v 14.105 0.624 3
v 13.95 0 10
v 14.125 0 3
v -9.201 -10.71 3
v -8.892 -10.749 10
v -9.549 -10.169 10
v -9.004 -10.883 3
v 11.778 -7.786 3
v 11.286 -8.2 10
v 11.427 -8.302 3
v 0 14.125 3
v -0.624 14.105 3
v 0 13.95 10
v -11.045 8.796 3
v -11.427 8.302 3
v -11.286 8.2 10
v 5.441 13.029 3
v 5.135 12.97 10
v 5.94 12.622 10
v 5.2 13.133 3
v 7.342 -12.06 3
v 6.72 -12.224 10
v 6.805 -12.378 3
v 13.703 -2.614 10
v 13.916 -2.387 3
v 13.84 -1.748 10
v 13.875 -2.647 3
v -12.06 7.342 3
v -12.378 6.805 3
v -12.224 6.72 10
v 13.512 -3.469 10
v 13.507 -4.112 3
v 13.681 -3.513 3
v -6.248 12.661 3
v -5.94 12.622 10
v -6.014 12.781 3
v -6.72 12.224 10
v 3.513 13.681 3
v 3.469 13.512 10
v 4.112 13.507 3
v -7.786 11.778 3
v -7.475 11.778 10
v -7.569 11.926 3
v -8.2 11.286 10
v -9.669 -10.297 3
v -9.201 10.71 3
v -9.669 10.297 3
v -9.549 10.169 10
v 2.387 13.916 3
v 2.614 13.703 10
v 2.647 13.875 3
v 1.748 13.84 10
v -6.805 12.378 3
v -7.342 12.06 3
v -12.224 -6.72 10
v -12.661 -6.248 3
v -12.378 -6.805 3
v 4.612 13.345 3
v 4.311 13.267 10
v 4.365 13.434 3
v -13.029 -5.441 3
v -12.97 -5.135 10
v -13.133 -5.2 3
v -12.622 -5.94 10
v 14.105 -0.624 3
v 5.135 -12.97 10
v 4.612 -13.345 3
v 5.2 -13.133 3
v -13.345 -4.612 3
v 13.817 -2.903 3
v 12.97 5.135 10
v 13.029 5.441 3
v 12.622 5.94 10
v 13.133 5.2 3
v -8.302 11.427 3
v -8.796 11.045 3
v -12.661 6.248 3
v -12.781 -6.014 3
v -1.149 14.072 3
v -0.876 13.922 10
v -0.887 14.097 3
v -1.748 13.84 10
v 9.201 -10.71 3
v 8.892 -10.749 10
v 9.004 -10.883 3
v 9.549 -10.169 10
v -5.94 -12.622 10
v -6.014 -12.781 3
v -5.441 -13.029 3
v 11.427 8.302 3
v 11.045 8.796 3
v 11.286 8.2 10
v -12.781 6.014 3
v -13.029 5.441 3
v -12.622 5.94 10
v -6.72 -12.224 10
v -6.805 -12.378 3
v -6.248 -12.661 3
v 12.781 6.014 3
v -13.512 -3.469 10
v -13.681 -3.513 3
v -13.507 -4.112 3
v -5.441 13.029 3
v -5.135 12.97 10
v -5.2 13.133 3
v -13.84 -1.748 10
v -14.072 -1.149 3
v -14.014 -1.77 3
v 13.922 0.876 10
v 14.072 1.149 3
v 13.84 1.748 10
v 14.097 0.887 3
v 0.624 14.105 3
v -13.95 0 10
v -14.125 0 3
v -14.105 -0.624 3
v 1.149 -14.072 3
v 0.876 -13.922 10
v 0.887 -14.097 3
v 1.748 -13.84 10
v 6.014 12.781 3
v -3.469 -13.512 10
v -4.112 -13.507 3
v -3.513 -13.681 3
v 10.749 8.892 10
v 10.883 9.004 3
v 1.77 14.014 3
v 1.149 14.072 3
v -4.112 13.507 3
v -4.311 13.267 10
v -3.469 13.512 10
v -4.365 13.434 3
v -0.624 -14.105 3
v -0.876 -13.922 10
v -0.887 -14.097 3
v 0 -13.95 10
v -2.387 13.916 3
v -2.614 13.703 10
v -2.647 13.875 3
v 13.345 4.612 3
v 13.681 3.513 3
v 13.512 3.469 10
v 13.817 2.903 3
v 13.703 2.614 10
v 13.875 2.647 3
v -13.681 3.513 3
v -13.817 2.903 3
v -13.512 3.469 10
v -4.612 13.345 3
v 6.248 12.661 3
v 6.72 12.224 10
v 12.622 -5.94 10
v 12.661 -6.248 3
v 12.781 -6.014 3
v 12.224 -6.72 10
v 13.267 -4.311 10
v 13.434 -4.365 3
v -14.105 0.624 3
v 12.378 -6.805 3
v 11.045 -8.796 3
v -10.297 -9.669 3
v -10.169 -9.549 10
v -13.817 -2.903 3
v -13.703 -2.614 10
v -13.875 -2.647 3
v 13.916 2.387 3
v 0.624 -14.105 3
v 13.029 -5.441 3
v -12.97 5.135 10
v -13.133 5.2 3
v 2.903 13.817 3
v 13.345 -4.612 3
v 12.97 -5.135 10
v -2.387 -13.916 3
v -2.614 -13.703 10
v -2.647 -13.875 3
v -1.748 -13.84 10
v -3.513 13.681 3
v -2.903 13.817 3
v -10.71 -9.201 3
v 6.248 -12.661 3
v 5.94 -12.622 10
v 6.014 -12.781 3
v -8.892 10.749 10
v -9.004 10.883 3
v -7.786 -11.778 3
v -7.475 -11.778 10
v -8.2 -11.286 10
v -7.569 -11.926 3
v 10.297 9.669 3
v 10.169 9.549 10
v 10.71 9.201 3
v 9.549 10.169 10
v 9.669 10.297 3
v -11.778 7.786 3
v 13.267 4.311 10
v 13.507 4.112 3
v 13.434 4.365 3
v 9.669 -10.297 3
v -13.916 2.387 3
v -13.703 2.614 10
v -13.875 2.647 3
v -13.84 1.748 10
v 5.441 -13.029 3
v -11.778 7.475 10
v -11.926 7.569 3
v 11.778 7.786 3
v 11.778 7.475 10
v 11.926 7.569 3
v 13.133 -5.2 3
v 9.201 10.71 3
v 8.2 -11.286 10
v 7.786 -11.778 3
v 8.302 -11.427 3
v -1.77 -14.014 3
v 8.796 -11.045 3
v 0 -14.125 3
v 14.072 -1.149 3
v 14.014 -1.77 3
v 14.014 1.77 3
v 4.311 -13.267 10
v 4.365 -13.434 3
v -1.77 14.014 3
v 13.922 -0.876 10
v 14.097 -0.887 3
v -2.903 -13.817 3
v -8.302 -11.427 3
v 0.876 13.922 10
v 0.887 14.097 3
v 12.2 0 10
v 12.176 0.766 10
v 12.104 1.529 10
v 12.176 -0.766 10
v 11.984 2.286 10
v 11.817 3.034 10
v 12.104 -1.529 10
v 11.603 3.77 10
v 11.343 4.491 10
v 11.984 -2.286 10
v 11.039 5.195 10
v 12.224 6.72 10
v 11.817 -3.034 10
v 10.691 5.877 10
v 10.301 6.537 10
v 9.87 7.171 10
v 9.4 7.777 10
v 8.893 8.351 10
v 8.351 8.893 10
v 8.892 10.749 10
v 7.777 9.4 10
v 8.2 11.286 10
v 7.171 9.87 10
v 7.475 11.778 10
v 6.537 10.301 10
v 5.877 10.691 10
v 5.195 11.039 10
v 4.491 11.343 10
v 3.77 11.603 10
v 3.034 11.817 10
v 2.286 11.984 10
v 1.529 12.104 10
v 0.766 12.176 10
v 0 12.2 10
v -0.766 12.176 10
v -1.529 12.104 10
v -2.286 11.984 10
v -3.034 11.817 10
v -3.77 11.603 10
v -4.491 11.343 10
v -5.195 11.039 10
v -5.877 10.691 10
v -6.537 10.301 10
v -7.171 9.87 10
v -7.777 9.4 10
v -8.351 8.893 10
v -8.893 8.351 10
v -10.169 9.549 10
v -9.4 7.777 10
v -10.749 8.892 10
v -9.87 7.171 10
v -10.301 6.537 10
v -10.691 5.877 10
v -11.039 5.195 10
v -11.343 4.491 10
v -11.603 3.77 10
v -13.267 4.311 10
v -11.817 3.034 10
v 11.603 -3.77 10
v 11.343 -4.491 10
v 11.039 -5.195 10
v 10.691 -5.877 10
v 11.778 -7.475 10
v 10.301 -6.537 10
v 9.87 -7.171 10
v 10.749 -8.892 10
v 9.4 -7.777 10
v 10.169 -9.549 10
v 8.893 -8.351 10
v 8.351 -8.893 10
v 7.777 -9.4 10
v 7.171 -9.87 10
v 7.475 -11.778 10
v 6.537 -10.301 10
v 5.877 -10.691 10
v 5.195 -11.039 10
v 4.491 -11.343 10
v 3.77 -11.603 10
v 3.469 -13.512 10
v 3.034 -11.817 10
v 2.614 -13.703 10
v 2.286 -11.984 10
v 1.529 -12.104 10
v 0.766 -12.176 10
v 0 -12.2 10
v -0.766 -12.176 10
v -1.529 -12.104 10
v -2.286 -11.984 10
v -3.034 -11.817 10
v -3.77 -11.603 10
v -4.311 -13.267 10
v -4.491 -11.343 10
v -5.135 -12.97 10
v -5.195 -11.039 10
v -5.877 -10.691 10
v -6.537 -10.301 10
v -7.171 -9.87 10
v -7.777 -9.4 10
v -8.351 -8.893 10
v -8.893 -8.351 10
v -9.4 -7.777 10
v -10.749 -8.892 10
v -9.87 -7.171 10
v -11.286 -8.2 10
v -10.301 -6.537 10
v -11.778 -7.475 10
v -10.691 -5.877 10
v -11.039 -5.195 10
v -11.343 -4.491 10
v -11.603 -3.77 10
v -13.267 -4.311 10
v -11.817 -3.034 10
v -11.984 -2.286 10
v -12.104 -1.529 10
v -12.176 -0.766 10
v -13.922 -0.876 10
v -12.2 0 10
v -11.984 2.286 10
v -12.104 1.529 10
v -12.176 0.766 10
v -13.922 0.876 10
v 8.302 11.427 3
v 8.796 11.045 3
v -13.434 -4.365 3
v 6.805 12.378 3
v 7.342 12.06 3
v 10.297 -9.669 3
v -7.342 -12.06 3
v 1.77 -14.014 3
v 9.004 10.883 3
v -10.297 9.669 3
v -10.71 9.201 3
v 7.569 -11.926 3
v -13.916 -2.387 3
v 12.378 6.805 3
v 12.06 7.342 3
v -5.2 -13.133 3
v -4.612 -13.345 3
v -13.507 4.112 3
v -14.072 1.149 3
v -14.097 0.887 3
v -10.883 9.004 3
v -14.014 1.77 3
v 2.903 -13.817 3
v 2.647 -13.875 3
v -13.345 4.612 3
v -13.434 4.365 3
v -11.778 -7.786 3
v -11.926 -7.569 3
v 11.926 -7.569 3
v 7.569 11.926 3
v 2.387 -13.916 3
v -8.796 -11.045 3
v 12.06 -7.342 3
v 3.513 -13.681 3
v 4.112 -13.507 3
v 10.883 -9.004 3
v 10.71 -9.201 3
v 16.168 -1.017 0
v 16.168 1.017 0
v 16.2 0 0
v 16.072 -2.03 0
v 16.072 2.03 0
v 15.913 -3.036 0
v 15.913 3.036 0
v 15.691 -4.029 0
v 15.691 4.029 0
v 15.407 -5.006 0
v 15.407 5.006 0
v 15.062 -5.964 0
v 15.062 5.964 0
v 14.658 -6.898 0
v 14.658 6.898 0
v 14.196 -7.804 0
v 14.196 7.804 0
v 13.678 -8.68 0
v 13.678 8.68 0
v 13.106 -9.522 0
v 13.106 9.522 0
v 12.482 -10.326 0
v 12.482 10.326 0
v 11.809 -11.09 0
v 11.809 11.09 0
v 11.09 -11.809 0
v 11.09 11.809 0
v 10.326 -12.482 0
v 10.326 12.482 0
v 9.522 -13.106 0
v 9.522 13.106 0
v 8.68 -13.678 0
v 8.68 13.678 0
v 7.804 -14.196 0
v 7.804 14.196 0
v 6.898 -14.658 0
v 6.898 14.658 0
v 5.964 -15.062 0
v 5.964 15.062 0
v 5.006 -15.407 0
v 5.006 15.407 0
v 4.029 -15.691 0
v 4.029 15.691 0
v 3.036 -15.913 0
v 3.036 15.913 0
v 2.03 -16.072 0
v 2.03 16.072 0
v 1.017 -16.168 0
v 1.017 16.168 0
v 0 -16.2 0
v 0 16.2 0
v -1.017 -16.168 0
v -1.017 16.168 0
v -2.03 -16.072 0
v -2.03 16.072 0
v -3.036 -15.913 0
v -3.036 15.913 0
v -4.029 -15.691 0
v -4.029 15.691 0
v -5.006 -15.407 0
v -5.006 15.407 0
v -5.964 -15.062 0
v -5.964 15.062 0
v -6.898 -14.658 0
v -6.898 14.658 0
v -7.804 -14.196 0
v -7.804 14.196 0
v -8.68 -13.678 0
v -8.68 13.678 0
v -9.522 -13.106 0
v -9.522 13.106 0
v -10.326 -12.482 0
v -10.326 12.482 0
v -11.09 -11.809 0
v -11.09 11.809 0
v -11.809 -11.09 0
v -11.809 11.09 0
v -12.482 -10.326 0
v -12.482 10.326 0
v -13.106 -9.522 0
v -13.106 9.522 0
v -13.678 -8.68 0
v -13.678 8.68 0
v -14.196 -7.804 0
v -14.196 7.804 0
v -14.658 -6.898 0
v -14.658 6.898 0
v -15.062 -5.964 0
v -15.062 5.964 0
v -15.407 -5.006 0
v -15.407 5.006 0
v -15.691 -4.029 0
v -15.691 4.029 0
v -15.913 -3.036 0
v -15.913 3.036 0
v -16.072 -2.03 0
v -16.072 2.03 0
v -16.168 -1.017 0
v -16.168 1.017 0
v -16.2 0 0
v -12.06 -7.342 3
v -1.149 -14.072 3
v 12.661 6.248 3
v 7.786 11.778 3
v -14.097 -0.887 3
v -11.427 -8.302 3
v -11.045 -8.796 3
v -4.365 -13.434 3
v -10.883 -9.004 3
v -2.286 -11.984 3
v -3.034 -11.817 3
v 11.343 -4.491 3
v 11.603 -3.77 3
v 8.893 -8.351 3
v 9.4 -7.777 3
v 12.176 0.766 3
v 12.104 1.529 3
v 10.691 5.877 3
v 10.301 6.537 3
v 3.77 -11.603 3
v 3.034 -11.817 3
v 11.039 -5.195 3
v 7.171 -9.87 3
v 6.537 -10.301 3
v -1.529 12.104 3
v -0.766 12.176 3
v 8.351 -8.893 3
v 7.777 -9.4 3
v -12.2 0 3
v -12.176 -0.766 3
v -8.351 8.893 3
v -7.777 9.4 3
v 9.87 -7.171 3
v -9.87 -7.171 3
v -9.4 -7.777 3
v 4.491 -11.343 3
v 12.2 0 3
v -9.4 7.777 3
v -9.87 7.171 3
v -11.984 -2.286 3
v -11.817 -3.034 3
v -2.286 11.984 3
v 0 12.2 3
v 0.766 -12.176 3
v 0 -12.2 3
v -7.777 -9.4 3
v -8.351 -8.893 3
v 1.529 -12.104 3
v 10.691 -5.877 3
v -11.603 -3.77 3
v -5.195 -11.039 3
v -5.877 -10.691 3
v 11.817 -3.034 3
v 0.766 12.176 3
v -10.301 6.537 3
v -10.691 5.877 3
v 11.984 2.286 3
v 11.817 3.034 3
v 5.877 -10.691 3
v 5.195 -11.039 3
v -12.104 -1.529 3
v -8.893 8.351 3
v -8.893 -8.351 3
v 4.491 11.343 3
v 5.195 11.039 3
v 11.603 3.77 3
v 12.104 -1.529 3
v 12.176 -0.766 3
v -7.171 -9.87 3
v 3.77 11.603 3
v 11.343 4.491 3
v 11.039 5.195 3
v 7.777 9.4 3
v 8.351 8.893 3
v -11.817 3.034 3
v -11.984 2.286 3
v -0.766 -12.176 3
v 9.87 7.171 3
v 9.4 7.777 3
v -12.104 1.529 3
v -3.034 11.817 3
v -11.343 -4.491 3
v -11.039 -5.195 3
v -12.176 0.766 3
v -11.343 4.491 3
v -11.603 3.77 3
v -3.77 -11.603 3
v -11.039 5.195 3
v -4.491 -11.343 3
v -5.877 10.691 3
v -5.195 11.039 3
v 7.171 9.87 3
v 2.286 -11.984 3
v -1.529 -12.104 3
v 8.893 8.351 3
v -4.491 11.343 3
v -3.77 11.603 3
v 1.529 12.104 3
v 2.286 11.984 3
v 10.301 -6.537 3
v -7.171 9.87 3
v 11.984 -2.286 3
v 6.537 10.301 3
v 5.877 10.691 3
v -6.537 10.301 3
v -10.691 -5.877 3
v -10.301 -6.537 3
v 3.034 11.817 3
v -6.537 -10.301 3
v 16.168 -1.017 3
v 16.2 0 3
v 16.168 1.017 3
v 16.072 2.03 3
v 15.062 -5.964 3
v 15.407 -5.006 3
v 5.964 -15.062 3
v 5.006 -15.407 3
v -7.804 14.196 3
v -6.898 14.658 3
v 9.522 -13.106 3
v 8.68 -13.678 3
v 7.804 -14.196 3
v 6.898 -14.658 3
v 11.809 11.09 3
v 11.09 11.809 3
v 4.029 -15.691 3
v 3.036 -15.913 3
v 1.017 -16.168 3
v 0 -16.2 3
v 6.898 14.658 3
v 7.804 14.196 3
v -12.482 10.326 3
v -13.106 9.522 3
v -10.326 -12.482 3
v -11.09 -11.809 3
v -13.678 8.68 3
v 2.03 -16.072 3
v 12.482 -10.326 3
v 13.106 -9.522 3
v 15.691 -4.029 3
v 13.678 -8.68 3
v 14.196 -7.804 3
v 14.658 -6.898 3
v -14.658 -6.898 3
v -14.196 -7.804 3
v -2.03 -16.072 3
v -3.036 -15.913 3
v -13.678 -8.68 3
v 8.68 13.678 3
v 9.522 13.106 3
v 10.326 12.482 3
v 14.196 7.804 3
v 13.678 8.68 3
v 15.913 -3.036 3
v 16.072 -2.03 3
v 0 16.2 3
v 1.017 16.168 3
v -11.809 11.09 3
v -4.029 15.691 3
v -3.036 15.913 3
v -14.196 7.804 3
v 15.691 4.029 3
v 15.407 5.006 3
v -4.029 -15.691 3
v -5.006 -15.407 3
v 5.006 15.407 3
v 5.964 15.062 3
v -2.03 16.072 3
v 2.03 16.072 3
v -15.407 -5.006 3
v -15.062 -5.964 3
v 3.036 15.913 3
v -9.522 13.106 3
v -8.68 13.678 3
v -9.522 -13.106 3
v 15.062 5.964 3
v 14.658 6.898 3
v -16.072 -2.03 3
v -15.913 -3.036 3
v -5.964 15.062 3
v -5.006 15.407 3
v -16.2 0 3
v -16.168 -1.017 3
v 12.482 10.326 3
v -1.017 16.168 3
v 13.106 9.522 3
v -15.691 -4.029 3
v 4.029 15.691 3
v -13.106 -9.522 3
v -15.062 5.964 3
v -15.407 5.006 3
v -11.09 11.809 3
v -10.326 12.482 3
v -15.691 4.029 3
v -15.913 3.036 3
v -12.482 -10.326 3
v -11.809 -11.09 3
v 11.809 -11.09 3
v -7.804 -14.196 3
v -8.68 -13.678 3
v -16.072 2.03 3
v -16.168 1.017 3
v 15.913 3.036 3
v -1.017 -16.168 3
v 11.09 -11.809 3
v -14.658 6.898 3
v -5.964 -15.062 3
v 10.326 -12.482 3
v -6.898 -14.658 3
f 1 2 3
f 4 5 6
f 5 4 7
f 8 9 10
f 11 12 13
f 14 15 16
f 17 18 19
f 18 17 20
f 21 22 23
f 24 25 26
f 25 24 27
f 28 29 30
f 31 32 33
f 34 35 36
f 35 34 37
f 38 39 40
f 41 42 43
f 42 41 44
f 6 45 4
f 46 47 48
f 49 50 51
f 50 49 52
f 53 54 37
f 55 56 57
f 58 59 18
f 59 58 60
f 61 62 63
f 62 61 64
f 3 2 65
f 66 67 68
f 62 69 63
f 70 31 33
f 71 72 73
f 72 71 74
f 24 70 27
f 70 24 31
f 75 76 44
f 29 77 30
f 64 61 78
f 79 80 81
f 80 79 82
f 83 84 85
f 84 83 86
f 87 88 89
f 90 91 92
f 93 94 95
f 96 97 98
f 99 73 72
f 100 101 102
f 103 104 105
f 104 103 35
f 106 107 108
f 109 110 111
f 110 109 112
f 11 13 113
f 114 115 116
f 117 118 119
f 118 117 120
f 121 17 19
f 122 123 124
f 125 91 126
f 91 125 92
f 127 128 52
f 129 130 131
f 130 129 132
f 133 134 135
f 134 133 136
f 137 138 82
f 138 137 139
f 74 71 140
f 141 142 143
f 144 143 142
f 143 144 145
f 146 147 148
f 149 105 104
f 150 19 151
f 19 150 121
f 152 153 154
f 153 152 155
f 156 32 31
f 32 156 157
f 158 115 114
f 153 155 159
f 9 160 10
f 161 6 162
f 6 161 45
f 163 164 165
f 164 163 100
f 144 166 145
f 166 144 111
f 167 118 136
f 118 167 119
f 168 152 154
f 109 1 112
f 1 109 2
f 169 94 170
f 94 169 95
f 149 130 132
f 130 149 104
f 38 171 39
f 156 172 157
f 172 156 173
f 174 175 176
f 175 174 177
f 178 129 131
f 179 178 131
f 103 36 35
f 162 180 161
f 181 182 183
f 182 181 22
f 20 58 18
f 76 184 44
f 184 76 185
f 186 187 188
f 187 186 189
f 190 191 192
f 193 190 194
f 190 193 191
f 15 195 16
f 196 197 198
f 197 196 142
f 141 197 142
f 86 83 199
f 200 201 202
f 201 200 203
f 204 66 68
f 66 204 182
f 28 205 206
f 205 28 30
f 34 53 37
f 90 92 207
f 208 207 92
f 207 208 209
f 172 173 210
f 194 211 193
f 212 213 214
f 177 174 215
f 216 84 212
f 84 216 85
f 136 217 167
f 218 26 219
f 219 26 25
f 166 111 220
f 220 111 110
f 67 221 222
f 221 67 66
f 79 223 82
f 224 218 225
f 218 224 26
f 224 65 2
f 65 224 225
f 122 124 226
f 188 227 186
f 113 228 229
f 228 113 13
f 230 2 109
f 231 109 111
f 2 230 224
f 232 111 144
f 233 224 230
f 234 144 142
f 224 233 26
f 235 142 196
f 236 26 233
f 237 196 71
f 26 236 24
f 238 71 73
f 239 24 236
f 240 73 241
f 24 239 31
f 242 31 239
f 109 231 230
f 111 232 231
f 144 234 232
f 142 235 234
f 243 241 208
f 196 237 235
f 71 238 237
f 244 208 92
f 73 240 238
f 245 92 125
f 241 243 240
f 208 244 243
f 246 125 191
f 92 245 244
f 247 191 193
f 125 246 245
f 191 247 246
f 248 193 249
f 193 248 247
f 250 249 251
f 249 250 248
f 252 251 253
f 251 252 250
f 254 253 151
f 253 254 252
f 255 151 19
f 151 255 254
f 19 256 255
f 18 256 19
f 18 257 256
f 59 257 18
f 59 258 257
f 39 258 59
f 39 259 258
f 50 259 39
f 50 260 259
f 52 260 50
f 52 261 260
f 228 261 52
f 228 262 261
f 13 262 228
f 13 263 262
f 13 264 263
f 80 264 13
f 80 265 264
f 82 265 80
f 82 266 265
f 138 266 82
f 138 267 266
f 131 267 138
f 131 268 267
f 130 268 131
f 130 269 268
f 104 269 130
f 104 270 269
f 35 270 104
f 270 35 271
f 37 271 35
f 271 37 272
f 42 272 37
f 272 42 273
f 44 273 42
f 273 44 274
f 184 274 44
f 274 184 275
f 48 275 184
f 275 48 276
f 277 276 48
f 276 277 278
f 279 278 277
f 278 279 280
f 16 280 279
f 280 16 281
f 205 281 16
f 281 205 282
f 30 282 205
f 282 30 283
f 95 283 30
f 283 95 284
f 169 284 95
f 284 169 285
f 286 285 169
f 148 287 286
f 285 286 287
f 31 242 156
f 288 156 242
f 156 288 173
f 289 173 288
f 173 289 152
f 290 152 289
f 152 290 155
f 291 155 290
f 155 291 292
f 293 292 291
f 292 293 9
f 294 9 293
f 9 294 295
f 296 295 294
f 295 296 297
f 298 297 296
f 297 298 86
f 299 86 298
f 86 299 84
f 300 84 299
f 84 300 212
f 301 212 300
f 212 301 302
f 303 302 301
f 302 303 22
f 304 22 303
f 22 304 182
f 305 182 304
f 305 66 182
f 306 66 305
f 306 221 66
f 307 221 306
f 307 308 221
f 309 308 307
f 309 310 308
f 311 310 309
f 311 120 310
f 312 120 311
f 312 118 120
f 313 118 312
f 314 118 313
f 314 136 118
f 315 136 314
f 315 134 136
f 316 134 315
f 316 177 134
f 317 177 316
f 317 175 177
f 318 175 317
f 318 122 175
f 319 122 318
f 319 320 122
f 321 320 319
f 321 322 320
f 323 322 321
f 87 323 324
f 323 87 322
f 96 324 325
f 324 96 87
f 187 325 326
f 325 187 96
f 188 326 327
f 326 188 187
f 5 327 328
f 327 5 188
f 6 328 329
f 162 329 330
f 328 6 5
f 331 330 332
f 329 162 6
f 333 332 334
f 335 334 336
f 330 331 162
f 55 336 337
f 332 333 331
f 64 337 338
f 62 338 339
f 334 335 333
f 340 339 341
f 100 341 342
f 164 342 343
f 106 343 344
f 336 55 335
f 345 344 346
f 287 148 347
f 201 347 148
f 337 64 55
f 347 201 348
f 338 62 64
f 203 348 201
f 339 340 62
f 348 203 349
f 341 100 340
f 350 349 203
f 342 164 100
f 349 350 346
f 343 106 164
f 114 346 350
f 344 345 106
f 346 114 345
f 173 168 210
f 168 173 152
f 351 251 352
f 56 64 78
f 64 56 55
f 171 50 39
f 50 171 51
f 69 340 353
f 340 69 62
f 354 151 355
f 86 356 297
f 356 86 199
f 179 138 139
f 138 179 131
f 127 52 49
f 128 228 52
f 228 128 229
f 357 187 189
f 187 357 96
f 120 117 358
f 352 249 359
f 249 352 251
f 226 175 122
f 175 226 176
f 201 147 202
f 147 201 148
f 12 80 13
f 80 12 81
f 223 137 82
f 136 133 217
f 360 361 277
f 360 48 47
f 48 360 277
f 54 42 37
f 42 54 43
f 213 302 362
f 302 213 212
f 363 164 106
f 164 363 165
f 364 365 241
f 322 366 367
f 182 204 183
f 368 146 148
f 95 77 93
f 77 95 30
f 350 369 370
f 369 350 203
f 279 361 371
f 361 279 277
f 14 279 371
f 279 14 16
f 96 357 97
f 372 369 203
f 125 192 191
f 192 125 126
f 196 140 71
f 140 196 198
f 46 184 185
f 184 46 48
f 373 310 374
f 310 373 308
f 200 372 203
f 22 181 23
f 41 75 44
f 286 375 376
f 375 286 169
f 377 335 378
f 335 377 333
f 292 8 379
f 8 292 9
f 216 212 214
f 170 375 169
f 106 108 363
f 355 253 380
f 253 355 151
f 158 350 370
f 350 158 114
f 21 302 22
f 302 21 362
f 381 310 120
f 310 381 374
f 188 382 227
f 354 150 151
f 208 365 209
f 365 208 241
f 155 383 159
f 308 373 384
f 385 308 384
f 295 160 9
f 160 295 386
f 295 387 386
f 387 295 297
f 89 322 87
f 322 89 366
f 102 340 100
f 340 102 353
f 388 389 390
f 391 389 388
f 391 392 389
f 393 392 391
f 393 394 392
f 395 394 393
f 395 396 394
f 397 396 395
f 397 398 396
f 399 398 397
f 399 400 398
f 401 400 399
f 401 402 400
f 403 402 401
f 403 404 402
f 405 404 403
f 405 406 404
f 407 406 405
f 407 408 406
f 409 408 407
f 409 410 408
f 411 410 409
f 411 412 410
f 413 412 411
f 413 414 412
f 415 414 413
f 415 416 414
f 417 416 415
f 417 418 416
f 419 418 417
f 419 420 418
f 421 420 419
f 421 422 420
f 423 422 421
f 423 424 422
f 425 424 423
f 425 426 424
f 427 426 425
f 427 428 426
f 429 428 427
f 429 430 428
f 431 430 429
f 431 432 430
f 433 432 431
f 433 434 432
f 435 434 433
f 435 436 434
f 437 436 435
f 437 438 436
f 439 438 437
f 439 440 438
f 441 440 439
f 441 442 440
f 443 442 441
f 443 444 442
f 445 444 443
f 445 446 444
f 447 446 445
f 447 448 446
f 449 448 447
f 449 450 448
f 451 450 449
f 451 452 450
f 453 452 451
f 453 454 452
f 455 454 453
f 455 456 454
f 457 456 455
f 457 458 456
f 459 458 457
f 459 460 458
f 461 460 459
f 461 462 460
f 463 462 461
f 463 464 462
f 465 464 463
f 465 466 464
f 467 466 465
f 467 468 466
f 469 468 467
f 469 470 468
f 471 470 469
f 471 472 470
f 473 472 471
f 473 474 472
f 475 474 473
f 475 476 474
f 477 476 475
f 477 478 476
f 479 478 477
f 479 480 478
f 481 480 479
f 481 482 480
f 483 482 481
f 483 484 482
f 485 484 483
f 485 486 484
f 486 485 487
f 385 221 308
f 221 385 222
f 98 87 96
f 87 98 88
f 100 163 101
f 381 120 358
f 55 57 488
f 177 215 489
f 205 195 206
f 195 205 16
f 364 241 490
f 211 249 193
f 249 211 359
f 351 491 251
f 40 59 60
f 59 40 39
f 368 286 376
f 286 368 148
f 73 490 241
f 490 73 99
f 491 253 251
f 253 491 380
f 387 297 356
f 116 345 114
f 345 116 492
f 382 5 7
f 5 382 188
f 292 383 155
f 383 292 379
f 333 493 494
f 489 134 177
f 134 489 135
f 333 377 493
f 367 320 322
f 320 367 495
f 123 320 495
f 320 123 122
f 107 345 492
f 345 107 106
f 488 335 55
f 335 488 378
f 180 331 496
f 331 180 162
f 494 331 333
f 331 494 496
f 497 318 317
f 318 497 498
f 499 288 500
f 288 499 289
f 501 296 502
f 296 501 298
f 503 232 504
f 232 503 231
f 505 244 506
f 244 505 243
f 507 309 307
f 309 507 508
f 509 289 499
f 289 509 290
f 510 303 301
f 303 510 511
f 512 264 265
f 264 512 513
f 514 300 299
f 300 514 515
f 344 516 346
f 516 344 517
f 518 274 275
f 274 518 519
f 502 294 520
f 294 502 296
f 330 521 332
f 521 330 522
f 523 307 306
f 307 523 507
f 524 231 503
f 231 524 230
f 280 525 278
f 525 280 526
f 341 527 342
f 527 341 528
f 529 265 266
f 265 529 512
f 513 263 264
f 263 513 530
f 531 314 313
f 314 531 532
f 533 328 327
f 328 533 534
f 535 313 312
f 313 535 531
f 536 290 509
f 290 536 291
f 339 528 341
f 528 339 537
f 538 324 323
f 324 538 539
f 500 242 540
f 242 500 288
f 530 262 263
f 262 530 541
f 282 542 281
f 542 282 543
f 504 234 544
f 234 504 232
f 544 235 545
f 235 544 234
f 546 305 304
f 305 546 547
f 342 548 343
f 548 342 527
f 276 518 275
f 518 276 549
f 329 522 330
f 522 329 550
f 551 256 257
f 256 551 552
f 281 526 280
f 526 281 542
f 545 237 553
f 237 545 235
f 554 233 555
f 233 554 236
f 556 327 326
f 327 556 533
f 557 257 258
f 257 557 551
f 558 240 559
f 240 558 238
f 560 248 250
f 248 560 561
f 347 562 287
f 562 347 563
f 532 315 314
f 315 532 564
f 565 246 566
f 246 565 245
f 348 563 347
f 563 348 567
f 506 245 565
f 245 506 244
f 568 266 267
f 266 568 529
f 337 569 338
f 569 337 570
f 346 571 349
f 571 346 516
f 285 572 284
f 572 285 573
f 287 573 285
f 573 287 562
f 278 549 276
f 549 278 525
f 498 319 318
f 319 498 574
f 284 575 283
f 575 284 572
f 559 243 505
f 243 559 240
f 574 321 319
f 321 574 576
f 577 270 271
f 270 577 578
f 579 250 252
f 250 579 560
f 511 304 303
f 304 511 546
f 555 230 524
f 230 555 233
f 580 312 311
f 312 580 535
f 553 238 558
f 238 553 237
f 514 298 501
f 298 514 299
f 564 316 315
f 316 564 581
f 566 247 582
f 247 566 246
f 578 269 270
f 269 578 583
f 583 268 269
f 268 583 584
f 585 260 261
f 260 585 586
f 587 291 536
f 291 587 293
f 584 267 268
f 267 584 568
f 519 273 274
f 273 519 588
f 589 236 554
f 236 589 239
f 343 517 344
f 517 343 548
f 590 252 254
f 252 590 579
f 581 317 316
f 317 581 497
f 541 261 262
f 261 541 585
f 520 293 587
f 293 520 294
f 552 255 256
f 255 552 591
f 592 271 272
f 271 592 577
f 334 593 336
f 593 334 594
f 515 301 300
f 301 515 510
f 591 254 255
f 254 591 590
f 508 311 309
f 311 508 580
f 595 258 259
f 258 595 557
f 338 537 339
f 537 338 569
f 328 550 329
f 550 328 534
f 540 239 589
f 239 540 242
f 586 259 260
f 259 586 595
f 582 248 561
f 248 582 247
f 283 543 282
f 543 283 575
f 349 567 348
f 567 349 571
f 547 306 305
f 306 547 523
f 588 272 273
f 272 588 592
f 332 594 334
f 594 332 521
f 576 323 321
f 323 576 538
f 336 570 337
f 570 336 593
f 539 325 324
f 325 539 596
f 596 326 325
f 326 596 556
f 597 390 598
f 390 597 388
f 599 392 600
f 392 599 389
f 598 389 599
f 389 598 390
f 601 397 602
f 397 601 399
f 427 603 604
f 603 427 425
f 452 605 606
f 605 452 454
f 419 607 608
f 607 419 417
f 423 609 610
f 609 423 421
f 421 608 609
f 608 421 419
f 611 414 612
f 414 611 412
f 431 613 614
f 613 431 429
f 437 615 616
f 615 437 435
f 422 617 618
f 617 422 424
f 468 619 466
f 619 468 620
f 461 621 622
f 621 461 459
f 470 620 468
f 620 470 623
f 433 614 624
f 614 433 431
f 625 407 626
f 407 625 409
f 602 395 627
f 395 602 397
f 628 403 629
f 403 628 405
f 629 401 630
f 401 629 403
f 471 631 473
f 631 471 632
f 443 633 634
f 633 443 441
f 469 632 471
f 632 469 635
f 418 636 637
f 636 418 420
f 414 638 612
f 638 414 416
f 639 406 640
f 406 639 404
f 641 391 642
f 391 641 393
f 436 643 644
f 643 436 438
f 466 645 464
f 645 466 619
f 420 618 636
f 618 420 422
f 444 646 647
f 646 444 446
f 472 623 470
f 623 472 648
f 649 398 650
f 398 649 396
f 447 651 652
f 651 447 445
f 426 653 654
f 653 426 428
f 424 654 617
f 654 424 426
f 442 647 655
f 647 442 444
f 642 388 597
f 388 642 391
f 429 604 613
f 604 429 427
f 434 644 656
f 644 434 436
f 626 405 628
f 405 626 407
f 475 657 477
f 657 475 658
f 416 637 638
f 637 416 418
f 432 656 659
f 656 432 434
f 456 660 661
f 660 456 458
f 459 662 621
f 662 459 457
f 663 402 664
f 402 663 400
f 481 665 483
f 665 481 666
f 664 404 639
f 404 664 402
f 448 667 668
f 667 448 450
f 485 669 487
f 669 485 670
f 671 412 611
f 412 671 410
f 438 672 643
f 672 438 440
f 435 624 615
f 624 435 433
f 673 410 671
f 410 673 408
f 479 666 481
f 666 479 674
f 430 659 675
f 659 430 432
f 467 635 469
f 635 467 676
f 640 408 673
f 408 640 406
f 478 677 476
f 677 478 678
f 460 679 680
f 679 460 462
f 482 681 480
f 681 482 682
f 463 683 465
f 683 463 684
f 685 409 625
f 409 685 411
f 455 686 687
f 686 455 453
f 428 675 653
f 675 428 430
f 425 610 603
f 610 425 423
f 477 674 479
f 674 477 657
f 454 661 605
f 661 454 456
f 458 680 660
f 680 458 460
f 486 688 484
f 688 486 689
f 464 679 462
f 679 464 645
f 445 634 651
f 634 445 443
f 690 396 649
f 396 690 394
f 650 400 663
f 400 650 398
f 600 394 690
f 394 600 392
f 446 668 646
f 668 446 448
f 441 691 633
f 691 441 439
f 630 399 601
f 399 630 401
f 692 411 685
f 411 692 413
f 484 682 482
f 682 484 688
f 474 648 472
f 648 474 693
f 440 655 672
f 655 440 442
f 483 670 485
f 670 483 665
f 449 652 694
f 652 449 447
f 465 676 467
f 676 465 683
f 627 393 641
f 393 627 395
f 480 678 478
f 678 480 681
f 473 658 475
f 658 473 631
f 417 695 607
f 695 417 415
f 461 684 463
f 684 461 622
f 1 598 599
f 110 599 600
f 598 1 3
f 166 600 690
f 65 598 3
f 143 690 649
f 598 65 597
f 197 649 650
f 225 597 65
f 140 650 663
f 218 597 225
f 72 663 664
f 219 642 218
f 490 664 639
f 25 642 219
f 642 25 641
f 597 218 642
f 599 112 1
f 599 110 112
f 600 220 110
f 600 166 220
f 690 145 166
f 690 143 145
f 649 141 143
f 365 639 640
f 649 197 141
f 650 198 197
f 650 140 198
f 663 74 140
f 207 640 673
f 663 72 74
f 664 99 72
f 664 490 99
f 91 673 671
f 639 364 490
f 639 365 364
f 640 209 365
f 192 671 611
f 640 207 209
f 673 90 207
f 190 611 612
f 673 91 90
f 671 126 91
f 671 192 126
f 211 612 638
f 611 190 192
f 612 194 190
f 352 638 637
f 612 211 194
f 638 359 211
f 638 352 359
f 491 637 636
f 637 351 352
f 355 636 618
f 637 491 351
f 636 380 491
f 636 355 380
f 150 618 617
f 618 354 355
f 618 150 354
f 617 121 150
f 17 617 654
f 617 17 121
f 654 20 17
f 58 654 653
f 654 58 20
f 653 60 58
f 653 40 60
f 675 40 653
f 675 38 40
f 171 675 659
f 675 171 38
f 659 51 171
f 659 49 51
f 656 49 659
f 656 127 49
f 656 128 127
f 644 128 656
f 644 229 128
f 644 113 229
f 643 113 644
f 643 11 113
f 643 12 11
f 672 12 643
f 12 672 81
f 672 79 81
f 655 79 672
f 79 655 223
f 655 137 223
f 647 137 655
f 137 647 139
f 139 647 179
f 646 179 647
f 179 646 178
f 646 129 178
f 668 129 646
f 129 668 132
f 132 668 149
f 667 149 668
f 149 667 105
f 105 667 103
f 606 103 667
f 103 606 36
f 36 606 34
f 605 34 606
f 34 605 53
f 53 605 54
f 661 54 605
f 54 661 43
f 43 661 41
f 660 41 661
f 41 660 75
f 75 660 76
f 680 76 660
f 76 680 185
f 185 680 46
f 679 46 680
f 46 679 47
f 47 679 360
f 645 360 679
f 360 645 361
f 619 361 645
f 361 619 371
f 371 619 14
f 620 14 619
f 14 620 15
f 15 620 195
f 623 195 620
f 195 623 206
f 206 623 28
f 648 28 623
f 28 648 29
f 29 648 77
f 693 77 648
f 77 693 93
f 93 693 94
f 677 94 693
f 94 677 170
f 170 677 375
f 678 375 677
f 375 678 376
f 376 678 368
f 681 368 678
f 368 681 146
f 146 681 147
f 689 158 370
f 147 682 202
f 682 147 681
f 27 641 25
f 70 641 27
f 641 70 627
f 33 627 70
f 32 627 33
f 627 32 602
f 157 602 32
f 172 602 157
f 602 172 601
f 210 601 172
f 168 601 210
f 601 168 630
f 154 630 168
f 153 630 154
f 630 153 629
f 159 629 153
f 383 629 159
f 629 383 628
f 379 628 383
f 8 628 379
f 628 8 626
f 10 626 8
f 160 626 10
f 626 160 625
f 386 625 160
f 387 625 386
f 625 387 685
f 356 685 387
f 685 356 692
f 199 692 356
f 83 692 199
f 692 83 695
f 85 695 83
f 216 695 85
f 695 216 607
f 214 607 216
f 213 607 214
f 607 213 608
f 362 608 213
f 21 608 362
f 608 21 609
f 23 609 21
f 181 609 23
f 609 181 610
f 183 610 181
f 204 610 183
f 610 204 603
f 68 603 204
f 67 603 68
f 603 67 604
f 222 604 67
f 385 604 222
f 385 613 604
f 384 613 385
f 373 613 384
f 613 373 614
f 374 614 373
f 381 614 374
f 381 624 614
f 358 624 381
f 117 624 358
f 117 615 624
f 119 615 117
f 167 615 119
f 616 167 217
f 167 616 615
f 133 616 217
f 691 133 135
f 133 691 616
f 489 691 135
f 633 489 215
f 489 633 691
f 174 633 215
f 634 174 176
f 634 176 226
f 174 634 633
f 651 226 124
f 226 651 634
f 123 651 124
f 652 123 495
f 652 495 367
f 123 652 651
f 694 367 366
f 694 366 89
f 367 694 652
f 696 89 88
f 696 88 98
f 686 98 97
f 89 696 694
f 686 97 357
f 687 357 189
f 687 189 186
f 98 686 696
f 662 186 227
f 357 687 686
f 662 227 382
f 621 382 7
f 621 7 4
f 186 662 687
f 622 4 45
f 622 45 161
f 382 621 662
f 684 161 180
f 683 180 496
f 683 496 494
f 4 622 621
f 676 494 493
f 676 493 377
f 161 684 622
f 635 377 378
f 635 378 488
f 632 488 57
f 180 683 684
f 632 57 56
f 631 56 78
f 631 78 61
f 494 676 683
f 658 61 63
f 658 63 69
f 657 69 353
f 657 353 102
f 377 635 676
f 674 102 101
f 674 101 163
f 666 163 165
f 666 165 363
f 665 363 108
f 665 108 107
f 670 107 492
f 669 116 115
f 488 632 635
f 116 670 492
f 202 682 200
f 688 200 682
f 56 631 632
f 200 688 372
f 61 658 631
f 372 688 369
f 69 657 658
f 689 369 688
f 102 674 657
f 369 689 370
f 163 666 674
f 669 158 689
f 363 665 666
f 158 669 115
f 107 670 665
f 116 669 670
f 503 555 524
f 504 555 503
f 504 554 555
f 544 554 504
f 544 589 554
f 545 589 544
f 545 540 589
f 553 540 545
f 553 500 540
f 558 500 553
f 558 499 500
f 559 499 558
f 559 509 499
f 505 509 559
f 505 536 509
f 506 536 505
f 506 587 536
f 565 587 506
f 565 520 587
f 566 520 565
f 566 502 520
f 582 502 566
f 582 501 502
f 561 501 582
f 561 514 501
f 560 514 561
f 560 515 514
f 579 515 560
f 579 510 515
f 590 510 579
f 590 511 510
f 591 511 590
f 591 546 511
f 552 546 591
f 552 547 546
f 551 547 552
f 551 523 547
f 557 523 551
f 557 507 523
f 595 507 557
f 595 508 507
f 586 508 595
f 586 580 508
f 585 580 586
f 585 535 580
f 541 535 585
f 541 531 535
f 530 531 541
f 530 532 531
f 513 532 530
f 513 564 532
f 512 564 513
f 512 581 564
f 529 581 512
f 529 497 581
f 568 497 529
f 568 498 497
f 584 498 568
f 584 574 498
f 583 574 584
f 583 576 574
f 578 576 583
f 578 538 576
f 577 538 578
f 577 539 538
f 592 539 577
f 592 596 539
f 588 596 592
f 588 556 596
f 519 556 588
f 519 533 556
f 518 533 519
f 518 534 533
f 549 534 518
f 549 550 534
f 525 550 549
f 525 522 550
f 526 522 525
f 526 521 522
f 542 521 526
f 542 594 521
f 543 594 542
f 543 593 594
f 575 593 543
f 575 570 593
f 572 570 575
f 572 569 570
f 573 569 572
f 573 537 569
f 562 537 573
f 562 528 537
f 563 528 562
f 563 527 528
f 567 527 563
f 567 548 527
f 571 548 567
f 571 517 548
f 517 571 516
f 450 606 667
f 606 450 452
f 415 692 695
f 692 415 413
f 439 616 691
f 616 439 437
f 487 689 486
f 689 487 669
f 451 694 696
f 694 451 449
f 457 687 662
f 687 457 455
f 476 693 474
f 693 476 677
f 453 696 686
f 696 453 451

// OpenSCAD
// pvc pipe plug

$fn=100;

PR=14.2; //enter inner pvc pipe radius here (for 1" pvc pipe, PR=13.2; for 32mm in Ethiopia 14.2; for standard 1" PVC fitting, PR=16.90)

difference(){
    cylinder(10,PR,PR-0.25); 
    cylinder(30,PR-2,PR-2);
    }

cylinder(3,PR+2,PR+2); 
